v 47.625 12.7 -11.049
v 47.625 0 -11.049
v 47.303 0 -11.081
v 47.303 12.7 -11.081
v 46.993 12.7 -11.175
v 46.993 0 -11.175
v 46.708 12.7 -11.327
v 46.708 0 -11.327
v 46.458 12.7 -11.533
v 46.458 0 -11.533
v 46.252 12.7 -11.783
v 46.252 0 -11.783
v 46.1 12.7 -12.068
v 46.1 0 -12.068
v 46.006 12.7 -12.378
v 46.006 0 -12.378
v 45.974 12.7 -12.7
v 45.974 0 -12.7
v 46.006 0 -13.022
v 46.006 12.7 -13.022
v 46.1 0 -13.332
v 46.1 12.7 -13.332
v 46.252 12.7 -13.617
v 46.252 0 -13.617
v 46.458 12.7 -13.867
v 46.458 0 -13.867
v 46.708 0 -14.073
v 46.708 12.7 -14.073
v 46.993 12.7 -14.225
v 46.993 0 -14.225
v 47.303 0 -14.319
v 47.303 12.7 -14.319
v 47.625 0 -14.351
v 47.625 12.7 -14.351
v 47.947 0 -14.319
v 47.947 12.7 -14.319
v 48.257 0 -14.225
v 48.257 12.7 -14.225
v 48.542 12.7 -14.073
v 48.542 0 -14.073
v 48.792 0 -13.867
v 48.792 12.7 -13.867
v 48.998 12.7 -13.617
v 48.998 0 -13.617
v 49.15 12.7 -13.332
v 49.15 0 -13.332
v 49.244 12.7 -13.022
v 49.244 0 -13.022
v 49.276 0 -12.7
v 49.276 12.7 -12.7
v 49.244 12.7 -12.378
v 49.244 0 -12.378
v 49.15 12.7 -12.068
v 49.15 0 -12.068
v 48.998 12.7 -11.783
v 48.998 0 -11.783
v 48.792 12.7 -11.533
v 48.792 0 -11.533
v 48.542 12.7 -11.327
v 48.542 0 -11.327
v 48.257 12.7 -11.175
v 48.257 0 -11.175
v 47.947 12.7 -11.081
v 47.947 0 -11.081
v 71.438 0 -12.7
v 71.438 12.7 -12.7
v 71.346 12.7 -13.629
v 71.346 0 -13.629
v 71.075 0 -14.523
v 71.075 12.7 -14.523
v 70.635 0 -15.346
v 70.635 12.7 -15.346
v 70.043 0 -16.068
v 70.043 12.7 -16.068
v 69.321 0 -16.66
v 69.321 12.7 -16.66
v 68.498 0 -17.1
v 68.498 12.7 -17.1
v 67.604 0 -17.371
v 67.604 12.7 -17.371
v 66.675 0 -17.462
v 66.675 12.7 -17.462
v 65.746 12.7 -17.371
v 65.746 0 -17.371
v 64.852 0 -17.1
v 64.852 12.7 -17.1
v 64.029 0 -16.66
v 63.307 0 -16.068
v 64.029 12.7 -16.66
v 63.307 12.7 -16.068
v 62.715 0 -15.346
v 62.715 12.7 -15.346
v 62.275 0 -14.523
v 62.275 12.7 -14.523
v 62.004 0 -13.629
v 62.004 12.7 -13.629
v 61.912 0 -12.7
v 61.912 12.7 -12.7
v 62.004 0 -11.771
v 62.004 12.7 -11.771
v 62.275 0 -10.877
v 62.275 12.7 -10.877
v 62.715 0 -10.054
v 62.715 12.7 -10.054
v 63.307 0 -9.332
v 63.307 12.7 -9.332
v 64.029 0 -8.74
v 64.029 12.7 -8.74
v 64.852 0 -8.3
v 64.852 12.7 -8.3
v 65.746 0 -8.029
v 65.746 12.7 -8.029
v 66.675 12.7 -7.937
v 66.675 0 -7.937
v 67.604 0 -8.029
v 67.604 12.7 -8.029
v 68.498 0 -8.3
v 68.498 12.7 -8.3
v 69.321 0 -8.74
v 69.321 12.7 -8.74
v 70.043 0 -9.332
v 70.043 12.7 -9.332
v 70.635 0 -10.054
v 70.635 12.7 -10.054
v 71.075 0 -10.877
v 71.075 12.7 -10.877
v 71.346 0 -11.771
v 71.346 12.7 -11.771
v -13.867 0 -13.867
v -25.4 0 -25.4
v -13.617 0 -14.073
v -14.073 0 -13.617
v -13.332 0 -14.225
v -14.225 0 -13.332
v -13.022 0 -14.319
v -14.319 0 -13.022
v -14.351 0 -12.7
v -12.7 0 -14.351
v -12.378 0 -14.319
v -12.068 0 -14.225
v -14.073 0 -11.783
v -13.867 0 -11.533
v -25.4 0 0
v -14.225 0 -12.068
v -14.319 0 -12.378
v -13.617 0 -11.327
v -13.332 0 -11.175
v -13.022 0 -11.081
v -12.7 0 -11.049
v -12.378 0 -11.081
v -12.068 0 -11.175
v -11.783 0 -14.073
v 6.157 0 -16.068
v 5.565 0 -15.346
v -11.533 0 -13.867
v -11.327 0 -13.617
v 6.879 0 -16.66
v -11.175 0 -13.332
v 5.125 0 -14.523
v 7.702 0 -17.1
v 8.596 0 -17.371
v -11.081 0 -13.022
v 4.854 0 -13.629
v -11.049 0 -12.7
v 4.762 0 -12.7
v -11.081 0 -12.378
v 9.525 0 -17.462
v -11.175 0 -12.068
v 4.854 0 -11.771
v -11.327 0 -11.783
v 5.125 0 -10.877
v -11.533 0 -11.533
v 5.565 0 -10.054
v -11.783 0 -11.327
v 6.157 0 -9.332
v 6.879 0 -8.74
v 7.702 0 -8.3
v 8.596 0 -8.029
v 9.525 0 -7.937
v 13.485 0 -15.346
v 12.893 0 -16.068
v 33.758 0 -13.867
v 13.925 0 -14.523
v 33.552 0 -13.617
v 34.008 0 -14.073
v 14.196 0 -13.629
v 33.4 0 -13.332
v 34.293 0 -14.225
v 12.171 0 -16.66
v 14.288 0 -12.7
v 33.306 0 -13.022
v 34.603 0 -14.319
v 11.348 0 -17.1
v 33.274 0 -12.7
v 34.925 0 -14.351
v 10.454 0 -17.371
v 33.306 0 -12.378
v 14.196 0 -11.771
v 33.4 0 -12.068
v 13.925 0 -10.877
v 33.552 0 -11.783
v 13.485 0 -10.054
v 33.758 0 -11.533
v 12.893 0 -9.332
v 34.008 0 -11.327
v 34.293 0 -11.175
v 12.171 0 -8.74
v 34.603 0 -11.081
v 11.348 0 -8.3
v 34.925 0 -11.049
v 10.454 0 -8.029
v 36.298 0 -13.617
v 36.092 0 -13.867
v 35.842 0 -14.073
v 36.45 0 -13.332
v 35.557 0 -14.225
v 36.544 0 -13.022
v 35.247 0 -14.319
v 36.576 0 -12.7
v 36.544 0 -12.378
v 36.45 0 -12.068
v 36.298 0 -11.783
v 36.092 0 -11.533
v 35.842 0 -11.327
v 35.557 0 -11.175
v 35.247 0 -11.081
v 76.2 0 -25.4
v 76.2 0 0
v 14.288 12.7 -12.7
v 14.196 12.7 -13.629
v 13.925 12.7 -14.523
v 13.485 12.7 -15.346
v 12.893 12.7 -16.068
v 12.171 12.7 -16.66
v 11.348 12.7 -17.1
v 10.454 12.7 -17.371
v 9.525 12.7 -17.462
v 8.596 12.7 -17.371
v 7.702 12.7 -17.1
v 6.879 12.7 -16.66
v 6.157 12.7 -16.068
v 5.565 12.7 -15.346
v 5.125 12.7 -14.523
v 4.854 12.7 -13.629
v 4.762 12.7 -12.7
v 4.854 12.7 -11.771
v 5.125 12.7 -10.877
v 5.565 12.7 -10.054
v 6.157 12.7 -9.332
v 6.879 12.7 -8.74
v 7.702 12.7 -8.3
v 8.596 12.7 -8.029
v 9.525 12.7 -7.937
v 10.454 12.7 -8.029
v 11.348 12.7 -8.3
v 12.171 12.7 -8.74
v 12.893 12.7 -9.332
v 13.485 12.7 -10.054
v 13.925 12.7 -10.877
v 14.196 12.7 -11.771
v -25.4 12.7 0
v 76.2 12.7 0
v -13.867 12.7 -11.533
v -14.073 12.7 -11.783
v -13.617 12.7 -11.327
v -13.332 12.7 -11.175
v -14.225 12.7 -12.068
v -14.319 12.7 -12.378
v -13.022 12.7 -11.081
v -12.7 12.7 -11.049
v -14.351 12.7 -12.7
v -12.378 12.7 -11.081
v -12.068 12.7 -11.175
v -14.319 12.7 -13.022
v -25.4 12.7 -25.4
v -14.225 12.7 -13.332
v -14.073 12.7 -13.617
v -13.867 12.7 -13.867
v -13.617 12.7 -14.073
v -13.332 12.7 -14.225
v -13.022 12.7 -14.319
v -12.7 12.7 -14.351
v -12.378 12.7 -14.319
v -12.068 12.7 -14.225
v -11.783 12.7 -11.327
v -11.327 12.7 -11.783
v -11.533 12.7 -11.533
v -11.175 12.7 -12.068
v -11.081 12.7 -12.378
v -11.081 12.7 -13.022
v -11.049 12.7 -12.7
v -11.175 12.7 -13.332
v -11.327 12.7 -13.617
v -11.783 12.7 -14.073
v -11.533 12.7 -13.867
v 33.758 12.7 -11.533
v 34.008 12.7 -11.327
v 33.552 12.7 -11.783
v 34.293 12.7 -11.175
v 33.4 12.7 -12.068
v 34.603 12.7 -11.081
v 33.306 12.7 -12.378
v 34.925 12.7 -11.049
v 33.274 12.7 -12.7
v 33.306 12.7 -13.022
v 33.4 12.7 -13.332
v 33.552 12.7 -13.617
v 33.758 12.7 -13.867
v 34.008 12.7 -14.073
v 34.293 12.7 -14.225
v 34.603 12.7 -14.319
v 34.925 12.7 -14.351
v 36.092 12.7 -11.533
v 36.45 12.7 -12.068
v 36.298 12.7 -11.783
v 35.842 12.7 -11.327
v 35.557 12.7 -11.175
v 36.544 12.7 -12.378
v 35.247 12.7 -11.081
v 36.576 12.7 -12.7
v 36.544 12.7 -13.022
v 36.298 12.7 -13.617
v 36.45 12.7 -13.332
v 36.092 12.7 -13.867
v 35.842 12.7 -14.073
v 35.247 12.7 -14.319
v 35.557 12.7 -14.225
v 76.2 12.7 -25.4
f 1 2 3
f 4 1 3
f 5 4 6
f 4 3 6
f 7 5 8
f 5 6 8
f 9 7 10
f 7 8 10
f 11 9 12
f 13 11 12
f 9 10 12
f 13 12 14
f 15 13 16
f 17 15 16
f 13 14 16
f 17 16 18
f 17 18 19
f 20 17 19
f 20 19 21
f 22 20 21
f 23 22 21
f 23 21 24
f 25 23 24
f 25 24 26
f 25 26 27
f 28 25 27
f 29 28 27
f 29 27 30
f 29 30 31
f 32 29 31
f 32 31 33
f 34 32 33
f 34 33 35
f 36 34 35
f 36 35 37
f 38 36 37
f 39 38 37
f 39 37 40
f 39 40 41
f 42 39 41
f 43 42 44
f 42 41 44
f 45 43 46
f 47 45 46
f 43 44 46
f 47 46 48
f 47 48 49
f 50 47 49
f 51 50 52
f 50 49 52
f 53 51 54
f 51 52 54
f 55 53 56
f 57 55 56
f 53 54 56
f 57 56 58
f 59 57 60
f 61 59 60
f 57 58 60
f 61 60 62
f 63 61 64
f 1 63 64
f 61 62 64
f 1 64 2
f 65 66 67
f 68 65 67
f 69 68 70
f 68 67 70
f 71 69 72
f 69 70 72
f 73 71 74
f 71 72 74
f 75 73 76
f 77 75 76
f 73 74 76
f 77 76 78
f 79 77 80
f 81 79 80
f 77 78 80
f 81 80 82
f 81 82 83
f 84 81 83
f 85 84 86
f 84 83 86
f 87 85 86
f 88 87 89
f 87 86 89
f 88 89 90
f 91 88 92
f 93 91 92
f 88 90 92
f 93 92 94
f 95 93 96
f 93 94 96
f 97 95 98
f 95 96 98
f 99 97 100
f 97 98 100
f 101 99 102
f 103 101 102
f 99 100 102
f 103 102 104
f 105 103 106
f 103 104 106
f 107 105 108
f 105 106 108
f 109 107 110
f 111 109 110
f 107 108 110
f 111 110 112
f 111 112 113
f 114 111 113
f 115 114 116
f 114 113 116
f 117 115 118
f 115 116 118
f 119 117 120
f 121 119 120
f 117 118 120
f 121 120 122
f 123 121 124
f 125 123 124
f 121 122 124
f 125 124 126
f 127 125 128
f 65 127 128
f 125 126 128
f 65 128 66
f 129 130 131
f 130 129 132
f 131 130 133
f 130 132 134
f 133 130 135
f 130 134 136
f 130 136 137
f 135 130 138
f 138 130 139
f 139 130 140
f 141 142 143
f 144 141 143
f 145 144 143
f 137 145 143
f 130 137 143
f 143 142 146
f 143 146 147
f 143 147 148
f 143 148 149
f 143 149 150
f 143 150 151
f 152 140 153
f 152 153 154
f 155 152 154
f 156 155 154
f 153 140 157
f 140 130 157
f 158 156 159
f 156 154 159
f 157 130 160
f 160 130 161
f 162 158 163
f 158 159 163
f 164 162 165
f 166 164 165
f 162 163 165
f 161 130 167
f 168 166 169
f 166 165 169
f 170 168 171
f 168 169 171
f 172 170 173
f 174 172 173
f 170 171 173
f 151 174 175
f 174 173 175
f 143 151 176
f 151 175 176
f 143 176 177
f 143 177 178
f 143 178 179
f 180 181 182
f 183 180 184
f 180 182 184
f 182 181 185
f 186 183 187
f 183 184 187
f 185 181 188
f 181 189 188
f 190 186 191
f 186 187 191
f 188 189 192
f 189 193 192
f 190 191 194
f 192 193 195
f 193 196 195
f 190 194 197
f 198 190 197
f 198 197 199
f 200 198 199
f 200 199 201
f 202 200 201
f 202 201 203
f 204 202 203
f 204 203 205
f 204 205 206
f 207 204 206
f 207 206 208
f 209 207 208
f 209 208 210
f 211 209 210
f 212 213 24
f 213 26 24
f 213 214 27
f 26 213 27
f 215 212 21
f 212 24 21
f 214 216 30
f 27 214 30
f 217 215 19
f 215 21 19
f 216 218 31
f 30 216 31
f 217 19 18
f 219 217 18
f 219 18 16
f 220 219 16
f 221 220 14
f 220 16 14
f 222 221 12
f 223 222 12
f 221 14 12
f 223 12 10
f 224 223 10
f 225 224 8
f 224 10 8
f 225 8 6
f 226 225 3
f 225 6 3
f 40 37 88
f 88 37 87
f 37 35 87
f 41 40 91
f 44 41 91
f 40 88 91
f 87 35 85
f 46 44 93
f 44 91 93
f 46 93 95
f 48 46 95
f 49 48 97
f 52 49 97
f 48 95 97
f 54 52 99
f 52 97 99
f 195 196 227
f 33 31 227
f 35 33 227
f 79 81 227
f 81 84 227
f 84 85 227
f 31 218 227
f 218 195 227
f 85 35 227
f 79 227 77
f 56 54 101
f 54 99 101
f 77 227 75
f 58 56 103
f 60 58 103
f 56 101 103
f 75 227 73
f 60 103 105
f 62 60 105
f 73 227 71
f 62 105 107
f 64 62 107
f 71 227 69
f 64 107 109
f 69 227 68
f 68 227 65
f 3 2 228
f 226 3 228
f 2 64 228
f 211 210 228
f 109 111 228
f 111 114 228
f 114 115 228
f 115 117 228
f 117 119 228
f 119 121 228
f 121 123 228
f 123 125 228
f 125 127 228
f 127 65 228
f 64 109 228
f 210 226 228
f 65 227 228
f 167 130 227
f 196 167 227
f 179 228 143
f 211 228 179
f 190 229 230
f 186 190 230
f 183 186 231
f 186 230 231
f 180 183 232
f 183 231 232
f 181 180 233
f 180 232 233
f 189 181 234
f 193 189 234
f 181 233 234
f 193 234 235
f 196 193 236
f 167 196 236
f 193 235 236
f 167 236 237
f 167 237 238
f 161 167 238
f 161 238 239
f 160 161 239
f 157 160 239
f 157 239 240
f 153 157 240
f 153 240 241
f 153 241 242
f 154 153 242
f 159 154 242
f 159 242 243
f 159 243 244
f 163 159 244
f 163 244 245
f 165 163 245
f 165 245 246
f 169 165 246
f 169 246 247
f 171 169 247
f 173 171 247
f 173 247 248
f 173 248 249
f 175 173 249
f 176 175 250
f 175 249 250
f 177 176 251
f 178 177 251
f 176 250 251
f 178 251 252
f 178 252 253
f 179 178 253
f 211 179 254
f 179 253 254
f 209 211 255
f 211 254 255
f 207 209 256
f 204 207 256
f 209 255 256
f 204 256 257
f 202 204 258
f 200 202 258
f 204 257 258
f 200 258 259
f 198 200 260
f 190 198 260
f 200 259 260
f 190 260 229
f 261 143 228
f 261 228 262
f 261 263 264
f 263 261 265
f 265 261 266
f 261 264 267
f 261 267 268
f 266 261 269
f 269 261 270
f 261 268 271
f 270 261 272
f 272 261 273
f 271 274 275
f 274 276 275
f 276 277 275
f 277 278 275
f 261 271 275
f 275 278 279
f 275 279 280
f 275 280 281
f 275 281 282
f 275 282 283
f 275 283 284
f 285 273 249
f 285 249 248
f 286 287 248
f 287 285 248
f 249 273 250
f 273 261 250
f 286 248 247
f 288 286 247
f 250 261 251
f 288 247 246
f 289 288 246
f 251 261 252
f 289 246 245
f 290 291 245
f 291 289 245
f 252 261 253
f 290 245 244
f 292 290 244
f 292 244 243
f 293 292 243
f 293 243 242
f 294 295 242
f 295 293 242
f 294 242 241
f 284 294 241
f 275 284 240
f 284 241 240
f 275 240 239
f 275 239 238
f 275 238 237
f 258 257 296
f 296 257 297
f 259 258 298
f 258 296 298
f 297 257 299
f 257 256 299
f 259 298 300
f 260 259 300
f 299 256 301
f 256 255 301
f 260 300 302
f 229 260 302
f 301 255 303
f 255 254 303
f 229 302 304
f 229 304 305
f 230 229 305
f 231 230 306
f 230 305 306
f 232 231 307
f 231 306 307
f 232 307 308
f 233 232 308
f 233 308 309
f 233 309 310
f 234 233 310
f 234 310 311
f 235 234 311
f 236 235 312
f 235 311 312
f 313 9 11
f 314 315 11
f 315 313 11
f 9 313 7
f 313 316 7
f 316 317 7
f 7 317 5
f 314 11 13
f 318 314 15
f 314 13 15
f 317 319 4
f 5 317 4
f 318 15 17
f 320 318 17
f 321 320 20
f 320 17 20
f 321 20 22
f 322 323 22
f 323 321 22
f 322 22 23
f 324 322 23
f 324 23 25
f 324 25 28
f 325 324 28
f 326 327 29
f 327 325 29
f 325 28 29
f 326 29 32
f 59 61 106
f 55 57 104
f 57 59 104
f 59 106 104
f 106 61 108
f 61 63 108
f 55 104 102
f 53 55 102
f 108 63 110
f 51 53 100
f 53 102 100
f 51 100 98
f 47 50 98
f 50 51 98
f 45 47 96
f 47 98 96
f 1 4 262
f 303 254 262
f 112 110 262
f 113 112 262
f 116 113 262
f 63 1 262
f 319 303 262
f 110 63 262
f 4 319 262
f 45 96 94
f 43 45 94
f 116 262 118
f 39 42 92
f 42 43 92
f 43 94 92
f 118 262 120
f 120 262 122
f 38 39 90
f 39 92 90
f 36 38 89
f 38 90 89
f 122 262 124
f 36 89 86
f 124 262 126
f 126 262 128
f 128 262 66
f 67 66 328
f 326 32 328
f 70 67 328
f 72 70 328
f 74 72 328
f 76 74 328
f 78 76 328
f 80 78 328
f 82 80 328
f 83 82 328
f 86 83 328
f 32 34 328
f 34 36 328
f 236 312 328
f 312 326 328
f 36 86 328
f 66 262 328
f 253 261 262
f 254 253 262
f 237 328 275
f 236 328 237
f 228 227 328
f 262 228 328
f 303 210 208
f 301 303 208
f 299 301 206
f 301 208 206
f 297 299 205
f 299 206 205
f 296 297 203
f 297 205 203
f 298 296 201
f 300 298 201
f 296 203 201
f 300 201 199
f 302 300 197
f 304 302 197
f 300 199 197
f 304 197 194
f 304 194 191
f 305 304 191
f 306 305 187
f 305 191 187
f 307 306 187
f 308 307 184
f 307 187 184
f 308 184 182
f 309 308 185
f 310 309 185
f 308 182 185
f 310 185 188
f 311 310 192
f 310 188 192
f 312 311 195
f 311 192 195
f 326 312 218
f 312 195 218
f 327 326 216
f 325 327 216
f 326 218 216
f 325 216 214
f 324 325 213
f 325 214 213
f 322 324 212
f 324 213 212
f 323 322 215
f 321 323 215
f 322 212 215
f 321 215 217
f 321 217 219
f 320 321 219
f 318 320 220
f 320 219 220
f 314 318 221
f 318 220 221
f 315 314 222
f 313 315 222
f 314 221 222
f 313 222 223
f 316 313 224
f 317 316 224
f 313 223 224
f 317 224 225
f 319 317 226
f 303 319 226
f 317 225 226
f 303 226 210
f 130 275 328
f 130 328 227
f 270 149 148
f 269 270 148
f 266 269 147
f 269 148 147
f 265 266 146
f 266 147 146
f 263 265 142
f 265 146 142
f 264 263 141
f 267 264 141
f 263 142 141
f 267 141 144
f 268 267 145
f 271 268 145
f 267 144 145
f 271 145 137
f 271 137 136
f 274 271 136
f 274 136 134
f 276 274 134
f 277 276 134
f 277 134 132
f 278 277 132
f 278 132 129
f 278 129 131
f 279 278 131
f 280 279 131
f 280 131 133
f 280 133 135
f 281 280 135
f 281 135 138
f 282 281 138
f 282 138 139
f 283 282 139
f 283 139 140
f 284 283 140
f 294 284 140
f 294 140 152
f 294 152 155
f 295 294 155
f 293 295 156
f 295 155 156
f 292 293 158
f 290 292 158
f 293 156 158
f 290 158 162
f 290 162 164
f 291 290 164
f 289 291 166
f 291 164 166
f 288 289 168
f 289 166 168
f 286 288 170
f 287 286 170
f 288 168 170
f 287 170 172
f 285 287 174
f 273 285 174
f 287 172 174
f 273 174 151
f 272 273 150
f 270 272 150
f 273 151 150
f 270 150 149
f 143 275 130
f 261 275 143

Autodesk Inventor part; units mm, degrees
ref_plane "YZ Plane" through (0, 0, 0) normal (1, 0, 0) x (0, 1, 0)
ref_plane "XZ Plane" through (0, 0, 0) normal (0, 1, 0) x (-1, 0, 0)
ref_plane "XY Plane" through (0, 0, 0) normal (0, 0, 1) x (1, 0, 0)
sketch "Sketch1" plane through (0, 0, 0) normal (1, 0, 0) x (0, 1, 0)
  line L0 (0, 0) -> (12.7, 0)
  line L1 (12.7, 0) -> (12.7, -25.4)
  line L2 (12.7, -25.4) -> (0, -25.4)
  line L3 (0, -25.4) -> (0, 0)
  dimension "d0" = 12.7
  dimension "d1" = 25.4
extrude "Extrusion1" add sketch "Sketch1" along normal blind 76.2
sketch "Sketch2" plane through (0, 12.7, 0) normal (0, 1, 0) x (1, 0, 0)
  circle A0 centre (9.525, 12.7) radius 4.7625
  line L0 (0, 0) -> (76.2, 0) projected
  line L1 (0, 25.4) -> (76.2, 25.4) projected
  line L2 (0, 0) -> (0, 25.4) projected
  circle A1 centre (66.675, 12.7) radius 4.7625
  line L3 (76.2, 25.4) -> (76.2, 0) projected
  dimension "d4" = 12.7
  dimension "d5" = 25.4
  dimension "d6" = 9.525
  dimension "d7" = 4.7625
  dimension "d8" = 9.525
  dimension "d9" = 12.7
  dimension "d10" = 4.7625
extrude "Extrusion2" cut sketch "Sketch2" against normal through all contours A0 | A1
sketch "Sketch5" plane through (0, 12.7, 0) normal (0, 1, 0) x (1, 0, 0)
  line L0 (0, 0) -> (76.2, 0) projected
  line L1 (0, 25.4) -> (76.2, 25.4) projected
  circle A0 centre (66.675, 12.7) radius 4.7625 projected
  point P0 (47.625, 12.7)
  dimension "d26" = 12.7
  dimension "d27" = 25.4
  dimension "d28" = 19.05
hole "Hole2" at (47.625, 12.7, -12.7) direction (0, -1, 0) diameter 3.302 end through all thread size "8-32 UNC" class "2B" standard "ANSI Unified Screw Threads"
sketch "Sketch7" plane through (0, 0, 0) normal (-1, 0, 0) x (0, 0, 1)
  line L0 (-25.4, 12.7) -> (-25.4, 0) projected
  line L1 (0, 12.7) -> (-25.4, 12.7) projected
  line L2 (-25.4, 0) -> (0, 0)
  line L3 (0, 0) -> (0, 12.7)
  line L4 (0, 12.7) -> (-25.4, 12.7)
  line L5 (-25.4, 12.7) -> (-25.4, 0)
  point P0 (0, 0)
extrude "Extrusion4" add sketch "Sketch7" along normal blind 25.4
sketch "Sketch10" plane through (-25.4, 12.7, -25.4) normal (0, 1, 0) x (1, 0, 0)
  circle A0 centre (73.025, -12.7) radius 1.651 projected
  circle A1 centre (34.925, -12.7) radius 4.7625 projected
  circle A2 centre (92.075, -12.7) radius 4.7625 projected
  line L0 (101.6, 0) -> (101.6, -25.4) projected
  line L1 (101.6, 0) -> (0, 0) projected
  line L2 (0, -25.4) -> (0, 0) projected
  line L3 (101.6, -25.4) -> (0, -25.4) projected
  point P0 (25.4, -25.4)
  point P1 (12.7, -12.7)
  point P2 (88.9, -38.1)
  dimension "d56" = 25.4
  dimension "d58" = 12.7
  dimension "d61" = 12.7
hole "Hole4" at (-12.7, 12.7, -12.7) at (63.5, 12.7, 12.7) direction (0, -1, 0) diameter 3.302 end through all thread size "8-32 UNC" class "2B" standard "ANSI Unified Screw Threads"
sketch "Sketch11" plane through (76.2, 12.7, 0) normal (0, 1, 0) x (1, 0, 0)
  circle A0 centre (-88.9, 12.7) radius 1.651 projected
  circle A1 centre (-28.575, 12.7) radius 1.651 projected
  circle A2 centre (-66.675, 12.7) radius 4.7625 projected
  circle A3 centre (-9.525, 12.7) radius 4.7625 projected
  line L0 (0, 0) -> (-101.6, 0) projected
  line L1 (0, 25.4) -> (0, 0) projected
  line L2 (0, 25.4) -> (-101.6, 25.4) projected
  line L3 (-101.6, 0) -> (-101.6, 25.4) projected
  point P0 (-76.2, 0)
  point P1 (-41.275, 12.7)
  dimension "d73" = 12.7
  dimension "d74" = 12.7
  dimension "d75" = 12.7
hole "Hole5" at (34.925, 12.7, -12.7) direction (0, -1, 0) diameter 3.302 end through all thread size "8-32 UNC" class "2B" standard "ANSI Unified Screw Threads"
equation "\"d4\" = 0.5 * d5"
equation "\"d8\" = d6"
equation "\"d9\" = d4"
equation "\"d10\" = d7"
equation "\"d26\" = 0.5 * d27"
equation "\"d58\" = 0.5 * d56"
equation "\"d75\" = d74"
properties part number "L17_TSI_004"
